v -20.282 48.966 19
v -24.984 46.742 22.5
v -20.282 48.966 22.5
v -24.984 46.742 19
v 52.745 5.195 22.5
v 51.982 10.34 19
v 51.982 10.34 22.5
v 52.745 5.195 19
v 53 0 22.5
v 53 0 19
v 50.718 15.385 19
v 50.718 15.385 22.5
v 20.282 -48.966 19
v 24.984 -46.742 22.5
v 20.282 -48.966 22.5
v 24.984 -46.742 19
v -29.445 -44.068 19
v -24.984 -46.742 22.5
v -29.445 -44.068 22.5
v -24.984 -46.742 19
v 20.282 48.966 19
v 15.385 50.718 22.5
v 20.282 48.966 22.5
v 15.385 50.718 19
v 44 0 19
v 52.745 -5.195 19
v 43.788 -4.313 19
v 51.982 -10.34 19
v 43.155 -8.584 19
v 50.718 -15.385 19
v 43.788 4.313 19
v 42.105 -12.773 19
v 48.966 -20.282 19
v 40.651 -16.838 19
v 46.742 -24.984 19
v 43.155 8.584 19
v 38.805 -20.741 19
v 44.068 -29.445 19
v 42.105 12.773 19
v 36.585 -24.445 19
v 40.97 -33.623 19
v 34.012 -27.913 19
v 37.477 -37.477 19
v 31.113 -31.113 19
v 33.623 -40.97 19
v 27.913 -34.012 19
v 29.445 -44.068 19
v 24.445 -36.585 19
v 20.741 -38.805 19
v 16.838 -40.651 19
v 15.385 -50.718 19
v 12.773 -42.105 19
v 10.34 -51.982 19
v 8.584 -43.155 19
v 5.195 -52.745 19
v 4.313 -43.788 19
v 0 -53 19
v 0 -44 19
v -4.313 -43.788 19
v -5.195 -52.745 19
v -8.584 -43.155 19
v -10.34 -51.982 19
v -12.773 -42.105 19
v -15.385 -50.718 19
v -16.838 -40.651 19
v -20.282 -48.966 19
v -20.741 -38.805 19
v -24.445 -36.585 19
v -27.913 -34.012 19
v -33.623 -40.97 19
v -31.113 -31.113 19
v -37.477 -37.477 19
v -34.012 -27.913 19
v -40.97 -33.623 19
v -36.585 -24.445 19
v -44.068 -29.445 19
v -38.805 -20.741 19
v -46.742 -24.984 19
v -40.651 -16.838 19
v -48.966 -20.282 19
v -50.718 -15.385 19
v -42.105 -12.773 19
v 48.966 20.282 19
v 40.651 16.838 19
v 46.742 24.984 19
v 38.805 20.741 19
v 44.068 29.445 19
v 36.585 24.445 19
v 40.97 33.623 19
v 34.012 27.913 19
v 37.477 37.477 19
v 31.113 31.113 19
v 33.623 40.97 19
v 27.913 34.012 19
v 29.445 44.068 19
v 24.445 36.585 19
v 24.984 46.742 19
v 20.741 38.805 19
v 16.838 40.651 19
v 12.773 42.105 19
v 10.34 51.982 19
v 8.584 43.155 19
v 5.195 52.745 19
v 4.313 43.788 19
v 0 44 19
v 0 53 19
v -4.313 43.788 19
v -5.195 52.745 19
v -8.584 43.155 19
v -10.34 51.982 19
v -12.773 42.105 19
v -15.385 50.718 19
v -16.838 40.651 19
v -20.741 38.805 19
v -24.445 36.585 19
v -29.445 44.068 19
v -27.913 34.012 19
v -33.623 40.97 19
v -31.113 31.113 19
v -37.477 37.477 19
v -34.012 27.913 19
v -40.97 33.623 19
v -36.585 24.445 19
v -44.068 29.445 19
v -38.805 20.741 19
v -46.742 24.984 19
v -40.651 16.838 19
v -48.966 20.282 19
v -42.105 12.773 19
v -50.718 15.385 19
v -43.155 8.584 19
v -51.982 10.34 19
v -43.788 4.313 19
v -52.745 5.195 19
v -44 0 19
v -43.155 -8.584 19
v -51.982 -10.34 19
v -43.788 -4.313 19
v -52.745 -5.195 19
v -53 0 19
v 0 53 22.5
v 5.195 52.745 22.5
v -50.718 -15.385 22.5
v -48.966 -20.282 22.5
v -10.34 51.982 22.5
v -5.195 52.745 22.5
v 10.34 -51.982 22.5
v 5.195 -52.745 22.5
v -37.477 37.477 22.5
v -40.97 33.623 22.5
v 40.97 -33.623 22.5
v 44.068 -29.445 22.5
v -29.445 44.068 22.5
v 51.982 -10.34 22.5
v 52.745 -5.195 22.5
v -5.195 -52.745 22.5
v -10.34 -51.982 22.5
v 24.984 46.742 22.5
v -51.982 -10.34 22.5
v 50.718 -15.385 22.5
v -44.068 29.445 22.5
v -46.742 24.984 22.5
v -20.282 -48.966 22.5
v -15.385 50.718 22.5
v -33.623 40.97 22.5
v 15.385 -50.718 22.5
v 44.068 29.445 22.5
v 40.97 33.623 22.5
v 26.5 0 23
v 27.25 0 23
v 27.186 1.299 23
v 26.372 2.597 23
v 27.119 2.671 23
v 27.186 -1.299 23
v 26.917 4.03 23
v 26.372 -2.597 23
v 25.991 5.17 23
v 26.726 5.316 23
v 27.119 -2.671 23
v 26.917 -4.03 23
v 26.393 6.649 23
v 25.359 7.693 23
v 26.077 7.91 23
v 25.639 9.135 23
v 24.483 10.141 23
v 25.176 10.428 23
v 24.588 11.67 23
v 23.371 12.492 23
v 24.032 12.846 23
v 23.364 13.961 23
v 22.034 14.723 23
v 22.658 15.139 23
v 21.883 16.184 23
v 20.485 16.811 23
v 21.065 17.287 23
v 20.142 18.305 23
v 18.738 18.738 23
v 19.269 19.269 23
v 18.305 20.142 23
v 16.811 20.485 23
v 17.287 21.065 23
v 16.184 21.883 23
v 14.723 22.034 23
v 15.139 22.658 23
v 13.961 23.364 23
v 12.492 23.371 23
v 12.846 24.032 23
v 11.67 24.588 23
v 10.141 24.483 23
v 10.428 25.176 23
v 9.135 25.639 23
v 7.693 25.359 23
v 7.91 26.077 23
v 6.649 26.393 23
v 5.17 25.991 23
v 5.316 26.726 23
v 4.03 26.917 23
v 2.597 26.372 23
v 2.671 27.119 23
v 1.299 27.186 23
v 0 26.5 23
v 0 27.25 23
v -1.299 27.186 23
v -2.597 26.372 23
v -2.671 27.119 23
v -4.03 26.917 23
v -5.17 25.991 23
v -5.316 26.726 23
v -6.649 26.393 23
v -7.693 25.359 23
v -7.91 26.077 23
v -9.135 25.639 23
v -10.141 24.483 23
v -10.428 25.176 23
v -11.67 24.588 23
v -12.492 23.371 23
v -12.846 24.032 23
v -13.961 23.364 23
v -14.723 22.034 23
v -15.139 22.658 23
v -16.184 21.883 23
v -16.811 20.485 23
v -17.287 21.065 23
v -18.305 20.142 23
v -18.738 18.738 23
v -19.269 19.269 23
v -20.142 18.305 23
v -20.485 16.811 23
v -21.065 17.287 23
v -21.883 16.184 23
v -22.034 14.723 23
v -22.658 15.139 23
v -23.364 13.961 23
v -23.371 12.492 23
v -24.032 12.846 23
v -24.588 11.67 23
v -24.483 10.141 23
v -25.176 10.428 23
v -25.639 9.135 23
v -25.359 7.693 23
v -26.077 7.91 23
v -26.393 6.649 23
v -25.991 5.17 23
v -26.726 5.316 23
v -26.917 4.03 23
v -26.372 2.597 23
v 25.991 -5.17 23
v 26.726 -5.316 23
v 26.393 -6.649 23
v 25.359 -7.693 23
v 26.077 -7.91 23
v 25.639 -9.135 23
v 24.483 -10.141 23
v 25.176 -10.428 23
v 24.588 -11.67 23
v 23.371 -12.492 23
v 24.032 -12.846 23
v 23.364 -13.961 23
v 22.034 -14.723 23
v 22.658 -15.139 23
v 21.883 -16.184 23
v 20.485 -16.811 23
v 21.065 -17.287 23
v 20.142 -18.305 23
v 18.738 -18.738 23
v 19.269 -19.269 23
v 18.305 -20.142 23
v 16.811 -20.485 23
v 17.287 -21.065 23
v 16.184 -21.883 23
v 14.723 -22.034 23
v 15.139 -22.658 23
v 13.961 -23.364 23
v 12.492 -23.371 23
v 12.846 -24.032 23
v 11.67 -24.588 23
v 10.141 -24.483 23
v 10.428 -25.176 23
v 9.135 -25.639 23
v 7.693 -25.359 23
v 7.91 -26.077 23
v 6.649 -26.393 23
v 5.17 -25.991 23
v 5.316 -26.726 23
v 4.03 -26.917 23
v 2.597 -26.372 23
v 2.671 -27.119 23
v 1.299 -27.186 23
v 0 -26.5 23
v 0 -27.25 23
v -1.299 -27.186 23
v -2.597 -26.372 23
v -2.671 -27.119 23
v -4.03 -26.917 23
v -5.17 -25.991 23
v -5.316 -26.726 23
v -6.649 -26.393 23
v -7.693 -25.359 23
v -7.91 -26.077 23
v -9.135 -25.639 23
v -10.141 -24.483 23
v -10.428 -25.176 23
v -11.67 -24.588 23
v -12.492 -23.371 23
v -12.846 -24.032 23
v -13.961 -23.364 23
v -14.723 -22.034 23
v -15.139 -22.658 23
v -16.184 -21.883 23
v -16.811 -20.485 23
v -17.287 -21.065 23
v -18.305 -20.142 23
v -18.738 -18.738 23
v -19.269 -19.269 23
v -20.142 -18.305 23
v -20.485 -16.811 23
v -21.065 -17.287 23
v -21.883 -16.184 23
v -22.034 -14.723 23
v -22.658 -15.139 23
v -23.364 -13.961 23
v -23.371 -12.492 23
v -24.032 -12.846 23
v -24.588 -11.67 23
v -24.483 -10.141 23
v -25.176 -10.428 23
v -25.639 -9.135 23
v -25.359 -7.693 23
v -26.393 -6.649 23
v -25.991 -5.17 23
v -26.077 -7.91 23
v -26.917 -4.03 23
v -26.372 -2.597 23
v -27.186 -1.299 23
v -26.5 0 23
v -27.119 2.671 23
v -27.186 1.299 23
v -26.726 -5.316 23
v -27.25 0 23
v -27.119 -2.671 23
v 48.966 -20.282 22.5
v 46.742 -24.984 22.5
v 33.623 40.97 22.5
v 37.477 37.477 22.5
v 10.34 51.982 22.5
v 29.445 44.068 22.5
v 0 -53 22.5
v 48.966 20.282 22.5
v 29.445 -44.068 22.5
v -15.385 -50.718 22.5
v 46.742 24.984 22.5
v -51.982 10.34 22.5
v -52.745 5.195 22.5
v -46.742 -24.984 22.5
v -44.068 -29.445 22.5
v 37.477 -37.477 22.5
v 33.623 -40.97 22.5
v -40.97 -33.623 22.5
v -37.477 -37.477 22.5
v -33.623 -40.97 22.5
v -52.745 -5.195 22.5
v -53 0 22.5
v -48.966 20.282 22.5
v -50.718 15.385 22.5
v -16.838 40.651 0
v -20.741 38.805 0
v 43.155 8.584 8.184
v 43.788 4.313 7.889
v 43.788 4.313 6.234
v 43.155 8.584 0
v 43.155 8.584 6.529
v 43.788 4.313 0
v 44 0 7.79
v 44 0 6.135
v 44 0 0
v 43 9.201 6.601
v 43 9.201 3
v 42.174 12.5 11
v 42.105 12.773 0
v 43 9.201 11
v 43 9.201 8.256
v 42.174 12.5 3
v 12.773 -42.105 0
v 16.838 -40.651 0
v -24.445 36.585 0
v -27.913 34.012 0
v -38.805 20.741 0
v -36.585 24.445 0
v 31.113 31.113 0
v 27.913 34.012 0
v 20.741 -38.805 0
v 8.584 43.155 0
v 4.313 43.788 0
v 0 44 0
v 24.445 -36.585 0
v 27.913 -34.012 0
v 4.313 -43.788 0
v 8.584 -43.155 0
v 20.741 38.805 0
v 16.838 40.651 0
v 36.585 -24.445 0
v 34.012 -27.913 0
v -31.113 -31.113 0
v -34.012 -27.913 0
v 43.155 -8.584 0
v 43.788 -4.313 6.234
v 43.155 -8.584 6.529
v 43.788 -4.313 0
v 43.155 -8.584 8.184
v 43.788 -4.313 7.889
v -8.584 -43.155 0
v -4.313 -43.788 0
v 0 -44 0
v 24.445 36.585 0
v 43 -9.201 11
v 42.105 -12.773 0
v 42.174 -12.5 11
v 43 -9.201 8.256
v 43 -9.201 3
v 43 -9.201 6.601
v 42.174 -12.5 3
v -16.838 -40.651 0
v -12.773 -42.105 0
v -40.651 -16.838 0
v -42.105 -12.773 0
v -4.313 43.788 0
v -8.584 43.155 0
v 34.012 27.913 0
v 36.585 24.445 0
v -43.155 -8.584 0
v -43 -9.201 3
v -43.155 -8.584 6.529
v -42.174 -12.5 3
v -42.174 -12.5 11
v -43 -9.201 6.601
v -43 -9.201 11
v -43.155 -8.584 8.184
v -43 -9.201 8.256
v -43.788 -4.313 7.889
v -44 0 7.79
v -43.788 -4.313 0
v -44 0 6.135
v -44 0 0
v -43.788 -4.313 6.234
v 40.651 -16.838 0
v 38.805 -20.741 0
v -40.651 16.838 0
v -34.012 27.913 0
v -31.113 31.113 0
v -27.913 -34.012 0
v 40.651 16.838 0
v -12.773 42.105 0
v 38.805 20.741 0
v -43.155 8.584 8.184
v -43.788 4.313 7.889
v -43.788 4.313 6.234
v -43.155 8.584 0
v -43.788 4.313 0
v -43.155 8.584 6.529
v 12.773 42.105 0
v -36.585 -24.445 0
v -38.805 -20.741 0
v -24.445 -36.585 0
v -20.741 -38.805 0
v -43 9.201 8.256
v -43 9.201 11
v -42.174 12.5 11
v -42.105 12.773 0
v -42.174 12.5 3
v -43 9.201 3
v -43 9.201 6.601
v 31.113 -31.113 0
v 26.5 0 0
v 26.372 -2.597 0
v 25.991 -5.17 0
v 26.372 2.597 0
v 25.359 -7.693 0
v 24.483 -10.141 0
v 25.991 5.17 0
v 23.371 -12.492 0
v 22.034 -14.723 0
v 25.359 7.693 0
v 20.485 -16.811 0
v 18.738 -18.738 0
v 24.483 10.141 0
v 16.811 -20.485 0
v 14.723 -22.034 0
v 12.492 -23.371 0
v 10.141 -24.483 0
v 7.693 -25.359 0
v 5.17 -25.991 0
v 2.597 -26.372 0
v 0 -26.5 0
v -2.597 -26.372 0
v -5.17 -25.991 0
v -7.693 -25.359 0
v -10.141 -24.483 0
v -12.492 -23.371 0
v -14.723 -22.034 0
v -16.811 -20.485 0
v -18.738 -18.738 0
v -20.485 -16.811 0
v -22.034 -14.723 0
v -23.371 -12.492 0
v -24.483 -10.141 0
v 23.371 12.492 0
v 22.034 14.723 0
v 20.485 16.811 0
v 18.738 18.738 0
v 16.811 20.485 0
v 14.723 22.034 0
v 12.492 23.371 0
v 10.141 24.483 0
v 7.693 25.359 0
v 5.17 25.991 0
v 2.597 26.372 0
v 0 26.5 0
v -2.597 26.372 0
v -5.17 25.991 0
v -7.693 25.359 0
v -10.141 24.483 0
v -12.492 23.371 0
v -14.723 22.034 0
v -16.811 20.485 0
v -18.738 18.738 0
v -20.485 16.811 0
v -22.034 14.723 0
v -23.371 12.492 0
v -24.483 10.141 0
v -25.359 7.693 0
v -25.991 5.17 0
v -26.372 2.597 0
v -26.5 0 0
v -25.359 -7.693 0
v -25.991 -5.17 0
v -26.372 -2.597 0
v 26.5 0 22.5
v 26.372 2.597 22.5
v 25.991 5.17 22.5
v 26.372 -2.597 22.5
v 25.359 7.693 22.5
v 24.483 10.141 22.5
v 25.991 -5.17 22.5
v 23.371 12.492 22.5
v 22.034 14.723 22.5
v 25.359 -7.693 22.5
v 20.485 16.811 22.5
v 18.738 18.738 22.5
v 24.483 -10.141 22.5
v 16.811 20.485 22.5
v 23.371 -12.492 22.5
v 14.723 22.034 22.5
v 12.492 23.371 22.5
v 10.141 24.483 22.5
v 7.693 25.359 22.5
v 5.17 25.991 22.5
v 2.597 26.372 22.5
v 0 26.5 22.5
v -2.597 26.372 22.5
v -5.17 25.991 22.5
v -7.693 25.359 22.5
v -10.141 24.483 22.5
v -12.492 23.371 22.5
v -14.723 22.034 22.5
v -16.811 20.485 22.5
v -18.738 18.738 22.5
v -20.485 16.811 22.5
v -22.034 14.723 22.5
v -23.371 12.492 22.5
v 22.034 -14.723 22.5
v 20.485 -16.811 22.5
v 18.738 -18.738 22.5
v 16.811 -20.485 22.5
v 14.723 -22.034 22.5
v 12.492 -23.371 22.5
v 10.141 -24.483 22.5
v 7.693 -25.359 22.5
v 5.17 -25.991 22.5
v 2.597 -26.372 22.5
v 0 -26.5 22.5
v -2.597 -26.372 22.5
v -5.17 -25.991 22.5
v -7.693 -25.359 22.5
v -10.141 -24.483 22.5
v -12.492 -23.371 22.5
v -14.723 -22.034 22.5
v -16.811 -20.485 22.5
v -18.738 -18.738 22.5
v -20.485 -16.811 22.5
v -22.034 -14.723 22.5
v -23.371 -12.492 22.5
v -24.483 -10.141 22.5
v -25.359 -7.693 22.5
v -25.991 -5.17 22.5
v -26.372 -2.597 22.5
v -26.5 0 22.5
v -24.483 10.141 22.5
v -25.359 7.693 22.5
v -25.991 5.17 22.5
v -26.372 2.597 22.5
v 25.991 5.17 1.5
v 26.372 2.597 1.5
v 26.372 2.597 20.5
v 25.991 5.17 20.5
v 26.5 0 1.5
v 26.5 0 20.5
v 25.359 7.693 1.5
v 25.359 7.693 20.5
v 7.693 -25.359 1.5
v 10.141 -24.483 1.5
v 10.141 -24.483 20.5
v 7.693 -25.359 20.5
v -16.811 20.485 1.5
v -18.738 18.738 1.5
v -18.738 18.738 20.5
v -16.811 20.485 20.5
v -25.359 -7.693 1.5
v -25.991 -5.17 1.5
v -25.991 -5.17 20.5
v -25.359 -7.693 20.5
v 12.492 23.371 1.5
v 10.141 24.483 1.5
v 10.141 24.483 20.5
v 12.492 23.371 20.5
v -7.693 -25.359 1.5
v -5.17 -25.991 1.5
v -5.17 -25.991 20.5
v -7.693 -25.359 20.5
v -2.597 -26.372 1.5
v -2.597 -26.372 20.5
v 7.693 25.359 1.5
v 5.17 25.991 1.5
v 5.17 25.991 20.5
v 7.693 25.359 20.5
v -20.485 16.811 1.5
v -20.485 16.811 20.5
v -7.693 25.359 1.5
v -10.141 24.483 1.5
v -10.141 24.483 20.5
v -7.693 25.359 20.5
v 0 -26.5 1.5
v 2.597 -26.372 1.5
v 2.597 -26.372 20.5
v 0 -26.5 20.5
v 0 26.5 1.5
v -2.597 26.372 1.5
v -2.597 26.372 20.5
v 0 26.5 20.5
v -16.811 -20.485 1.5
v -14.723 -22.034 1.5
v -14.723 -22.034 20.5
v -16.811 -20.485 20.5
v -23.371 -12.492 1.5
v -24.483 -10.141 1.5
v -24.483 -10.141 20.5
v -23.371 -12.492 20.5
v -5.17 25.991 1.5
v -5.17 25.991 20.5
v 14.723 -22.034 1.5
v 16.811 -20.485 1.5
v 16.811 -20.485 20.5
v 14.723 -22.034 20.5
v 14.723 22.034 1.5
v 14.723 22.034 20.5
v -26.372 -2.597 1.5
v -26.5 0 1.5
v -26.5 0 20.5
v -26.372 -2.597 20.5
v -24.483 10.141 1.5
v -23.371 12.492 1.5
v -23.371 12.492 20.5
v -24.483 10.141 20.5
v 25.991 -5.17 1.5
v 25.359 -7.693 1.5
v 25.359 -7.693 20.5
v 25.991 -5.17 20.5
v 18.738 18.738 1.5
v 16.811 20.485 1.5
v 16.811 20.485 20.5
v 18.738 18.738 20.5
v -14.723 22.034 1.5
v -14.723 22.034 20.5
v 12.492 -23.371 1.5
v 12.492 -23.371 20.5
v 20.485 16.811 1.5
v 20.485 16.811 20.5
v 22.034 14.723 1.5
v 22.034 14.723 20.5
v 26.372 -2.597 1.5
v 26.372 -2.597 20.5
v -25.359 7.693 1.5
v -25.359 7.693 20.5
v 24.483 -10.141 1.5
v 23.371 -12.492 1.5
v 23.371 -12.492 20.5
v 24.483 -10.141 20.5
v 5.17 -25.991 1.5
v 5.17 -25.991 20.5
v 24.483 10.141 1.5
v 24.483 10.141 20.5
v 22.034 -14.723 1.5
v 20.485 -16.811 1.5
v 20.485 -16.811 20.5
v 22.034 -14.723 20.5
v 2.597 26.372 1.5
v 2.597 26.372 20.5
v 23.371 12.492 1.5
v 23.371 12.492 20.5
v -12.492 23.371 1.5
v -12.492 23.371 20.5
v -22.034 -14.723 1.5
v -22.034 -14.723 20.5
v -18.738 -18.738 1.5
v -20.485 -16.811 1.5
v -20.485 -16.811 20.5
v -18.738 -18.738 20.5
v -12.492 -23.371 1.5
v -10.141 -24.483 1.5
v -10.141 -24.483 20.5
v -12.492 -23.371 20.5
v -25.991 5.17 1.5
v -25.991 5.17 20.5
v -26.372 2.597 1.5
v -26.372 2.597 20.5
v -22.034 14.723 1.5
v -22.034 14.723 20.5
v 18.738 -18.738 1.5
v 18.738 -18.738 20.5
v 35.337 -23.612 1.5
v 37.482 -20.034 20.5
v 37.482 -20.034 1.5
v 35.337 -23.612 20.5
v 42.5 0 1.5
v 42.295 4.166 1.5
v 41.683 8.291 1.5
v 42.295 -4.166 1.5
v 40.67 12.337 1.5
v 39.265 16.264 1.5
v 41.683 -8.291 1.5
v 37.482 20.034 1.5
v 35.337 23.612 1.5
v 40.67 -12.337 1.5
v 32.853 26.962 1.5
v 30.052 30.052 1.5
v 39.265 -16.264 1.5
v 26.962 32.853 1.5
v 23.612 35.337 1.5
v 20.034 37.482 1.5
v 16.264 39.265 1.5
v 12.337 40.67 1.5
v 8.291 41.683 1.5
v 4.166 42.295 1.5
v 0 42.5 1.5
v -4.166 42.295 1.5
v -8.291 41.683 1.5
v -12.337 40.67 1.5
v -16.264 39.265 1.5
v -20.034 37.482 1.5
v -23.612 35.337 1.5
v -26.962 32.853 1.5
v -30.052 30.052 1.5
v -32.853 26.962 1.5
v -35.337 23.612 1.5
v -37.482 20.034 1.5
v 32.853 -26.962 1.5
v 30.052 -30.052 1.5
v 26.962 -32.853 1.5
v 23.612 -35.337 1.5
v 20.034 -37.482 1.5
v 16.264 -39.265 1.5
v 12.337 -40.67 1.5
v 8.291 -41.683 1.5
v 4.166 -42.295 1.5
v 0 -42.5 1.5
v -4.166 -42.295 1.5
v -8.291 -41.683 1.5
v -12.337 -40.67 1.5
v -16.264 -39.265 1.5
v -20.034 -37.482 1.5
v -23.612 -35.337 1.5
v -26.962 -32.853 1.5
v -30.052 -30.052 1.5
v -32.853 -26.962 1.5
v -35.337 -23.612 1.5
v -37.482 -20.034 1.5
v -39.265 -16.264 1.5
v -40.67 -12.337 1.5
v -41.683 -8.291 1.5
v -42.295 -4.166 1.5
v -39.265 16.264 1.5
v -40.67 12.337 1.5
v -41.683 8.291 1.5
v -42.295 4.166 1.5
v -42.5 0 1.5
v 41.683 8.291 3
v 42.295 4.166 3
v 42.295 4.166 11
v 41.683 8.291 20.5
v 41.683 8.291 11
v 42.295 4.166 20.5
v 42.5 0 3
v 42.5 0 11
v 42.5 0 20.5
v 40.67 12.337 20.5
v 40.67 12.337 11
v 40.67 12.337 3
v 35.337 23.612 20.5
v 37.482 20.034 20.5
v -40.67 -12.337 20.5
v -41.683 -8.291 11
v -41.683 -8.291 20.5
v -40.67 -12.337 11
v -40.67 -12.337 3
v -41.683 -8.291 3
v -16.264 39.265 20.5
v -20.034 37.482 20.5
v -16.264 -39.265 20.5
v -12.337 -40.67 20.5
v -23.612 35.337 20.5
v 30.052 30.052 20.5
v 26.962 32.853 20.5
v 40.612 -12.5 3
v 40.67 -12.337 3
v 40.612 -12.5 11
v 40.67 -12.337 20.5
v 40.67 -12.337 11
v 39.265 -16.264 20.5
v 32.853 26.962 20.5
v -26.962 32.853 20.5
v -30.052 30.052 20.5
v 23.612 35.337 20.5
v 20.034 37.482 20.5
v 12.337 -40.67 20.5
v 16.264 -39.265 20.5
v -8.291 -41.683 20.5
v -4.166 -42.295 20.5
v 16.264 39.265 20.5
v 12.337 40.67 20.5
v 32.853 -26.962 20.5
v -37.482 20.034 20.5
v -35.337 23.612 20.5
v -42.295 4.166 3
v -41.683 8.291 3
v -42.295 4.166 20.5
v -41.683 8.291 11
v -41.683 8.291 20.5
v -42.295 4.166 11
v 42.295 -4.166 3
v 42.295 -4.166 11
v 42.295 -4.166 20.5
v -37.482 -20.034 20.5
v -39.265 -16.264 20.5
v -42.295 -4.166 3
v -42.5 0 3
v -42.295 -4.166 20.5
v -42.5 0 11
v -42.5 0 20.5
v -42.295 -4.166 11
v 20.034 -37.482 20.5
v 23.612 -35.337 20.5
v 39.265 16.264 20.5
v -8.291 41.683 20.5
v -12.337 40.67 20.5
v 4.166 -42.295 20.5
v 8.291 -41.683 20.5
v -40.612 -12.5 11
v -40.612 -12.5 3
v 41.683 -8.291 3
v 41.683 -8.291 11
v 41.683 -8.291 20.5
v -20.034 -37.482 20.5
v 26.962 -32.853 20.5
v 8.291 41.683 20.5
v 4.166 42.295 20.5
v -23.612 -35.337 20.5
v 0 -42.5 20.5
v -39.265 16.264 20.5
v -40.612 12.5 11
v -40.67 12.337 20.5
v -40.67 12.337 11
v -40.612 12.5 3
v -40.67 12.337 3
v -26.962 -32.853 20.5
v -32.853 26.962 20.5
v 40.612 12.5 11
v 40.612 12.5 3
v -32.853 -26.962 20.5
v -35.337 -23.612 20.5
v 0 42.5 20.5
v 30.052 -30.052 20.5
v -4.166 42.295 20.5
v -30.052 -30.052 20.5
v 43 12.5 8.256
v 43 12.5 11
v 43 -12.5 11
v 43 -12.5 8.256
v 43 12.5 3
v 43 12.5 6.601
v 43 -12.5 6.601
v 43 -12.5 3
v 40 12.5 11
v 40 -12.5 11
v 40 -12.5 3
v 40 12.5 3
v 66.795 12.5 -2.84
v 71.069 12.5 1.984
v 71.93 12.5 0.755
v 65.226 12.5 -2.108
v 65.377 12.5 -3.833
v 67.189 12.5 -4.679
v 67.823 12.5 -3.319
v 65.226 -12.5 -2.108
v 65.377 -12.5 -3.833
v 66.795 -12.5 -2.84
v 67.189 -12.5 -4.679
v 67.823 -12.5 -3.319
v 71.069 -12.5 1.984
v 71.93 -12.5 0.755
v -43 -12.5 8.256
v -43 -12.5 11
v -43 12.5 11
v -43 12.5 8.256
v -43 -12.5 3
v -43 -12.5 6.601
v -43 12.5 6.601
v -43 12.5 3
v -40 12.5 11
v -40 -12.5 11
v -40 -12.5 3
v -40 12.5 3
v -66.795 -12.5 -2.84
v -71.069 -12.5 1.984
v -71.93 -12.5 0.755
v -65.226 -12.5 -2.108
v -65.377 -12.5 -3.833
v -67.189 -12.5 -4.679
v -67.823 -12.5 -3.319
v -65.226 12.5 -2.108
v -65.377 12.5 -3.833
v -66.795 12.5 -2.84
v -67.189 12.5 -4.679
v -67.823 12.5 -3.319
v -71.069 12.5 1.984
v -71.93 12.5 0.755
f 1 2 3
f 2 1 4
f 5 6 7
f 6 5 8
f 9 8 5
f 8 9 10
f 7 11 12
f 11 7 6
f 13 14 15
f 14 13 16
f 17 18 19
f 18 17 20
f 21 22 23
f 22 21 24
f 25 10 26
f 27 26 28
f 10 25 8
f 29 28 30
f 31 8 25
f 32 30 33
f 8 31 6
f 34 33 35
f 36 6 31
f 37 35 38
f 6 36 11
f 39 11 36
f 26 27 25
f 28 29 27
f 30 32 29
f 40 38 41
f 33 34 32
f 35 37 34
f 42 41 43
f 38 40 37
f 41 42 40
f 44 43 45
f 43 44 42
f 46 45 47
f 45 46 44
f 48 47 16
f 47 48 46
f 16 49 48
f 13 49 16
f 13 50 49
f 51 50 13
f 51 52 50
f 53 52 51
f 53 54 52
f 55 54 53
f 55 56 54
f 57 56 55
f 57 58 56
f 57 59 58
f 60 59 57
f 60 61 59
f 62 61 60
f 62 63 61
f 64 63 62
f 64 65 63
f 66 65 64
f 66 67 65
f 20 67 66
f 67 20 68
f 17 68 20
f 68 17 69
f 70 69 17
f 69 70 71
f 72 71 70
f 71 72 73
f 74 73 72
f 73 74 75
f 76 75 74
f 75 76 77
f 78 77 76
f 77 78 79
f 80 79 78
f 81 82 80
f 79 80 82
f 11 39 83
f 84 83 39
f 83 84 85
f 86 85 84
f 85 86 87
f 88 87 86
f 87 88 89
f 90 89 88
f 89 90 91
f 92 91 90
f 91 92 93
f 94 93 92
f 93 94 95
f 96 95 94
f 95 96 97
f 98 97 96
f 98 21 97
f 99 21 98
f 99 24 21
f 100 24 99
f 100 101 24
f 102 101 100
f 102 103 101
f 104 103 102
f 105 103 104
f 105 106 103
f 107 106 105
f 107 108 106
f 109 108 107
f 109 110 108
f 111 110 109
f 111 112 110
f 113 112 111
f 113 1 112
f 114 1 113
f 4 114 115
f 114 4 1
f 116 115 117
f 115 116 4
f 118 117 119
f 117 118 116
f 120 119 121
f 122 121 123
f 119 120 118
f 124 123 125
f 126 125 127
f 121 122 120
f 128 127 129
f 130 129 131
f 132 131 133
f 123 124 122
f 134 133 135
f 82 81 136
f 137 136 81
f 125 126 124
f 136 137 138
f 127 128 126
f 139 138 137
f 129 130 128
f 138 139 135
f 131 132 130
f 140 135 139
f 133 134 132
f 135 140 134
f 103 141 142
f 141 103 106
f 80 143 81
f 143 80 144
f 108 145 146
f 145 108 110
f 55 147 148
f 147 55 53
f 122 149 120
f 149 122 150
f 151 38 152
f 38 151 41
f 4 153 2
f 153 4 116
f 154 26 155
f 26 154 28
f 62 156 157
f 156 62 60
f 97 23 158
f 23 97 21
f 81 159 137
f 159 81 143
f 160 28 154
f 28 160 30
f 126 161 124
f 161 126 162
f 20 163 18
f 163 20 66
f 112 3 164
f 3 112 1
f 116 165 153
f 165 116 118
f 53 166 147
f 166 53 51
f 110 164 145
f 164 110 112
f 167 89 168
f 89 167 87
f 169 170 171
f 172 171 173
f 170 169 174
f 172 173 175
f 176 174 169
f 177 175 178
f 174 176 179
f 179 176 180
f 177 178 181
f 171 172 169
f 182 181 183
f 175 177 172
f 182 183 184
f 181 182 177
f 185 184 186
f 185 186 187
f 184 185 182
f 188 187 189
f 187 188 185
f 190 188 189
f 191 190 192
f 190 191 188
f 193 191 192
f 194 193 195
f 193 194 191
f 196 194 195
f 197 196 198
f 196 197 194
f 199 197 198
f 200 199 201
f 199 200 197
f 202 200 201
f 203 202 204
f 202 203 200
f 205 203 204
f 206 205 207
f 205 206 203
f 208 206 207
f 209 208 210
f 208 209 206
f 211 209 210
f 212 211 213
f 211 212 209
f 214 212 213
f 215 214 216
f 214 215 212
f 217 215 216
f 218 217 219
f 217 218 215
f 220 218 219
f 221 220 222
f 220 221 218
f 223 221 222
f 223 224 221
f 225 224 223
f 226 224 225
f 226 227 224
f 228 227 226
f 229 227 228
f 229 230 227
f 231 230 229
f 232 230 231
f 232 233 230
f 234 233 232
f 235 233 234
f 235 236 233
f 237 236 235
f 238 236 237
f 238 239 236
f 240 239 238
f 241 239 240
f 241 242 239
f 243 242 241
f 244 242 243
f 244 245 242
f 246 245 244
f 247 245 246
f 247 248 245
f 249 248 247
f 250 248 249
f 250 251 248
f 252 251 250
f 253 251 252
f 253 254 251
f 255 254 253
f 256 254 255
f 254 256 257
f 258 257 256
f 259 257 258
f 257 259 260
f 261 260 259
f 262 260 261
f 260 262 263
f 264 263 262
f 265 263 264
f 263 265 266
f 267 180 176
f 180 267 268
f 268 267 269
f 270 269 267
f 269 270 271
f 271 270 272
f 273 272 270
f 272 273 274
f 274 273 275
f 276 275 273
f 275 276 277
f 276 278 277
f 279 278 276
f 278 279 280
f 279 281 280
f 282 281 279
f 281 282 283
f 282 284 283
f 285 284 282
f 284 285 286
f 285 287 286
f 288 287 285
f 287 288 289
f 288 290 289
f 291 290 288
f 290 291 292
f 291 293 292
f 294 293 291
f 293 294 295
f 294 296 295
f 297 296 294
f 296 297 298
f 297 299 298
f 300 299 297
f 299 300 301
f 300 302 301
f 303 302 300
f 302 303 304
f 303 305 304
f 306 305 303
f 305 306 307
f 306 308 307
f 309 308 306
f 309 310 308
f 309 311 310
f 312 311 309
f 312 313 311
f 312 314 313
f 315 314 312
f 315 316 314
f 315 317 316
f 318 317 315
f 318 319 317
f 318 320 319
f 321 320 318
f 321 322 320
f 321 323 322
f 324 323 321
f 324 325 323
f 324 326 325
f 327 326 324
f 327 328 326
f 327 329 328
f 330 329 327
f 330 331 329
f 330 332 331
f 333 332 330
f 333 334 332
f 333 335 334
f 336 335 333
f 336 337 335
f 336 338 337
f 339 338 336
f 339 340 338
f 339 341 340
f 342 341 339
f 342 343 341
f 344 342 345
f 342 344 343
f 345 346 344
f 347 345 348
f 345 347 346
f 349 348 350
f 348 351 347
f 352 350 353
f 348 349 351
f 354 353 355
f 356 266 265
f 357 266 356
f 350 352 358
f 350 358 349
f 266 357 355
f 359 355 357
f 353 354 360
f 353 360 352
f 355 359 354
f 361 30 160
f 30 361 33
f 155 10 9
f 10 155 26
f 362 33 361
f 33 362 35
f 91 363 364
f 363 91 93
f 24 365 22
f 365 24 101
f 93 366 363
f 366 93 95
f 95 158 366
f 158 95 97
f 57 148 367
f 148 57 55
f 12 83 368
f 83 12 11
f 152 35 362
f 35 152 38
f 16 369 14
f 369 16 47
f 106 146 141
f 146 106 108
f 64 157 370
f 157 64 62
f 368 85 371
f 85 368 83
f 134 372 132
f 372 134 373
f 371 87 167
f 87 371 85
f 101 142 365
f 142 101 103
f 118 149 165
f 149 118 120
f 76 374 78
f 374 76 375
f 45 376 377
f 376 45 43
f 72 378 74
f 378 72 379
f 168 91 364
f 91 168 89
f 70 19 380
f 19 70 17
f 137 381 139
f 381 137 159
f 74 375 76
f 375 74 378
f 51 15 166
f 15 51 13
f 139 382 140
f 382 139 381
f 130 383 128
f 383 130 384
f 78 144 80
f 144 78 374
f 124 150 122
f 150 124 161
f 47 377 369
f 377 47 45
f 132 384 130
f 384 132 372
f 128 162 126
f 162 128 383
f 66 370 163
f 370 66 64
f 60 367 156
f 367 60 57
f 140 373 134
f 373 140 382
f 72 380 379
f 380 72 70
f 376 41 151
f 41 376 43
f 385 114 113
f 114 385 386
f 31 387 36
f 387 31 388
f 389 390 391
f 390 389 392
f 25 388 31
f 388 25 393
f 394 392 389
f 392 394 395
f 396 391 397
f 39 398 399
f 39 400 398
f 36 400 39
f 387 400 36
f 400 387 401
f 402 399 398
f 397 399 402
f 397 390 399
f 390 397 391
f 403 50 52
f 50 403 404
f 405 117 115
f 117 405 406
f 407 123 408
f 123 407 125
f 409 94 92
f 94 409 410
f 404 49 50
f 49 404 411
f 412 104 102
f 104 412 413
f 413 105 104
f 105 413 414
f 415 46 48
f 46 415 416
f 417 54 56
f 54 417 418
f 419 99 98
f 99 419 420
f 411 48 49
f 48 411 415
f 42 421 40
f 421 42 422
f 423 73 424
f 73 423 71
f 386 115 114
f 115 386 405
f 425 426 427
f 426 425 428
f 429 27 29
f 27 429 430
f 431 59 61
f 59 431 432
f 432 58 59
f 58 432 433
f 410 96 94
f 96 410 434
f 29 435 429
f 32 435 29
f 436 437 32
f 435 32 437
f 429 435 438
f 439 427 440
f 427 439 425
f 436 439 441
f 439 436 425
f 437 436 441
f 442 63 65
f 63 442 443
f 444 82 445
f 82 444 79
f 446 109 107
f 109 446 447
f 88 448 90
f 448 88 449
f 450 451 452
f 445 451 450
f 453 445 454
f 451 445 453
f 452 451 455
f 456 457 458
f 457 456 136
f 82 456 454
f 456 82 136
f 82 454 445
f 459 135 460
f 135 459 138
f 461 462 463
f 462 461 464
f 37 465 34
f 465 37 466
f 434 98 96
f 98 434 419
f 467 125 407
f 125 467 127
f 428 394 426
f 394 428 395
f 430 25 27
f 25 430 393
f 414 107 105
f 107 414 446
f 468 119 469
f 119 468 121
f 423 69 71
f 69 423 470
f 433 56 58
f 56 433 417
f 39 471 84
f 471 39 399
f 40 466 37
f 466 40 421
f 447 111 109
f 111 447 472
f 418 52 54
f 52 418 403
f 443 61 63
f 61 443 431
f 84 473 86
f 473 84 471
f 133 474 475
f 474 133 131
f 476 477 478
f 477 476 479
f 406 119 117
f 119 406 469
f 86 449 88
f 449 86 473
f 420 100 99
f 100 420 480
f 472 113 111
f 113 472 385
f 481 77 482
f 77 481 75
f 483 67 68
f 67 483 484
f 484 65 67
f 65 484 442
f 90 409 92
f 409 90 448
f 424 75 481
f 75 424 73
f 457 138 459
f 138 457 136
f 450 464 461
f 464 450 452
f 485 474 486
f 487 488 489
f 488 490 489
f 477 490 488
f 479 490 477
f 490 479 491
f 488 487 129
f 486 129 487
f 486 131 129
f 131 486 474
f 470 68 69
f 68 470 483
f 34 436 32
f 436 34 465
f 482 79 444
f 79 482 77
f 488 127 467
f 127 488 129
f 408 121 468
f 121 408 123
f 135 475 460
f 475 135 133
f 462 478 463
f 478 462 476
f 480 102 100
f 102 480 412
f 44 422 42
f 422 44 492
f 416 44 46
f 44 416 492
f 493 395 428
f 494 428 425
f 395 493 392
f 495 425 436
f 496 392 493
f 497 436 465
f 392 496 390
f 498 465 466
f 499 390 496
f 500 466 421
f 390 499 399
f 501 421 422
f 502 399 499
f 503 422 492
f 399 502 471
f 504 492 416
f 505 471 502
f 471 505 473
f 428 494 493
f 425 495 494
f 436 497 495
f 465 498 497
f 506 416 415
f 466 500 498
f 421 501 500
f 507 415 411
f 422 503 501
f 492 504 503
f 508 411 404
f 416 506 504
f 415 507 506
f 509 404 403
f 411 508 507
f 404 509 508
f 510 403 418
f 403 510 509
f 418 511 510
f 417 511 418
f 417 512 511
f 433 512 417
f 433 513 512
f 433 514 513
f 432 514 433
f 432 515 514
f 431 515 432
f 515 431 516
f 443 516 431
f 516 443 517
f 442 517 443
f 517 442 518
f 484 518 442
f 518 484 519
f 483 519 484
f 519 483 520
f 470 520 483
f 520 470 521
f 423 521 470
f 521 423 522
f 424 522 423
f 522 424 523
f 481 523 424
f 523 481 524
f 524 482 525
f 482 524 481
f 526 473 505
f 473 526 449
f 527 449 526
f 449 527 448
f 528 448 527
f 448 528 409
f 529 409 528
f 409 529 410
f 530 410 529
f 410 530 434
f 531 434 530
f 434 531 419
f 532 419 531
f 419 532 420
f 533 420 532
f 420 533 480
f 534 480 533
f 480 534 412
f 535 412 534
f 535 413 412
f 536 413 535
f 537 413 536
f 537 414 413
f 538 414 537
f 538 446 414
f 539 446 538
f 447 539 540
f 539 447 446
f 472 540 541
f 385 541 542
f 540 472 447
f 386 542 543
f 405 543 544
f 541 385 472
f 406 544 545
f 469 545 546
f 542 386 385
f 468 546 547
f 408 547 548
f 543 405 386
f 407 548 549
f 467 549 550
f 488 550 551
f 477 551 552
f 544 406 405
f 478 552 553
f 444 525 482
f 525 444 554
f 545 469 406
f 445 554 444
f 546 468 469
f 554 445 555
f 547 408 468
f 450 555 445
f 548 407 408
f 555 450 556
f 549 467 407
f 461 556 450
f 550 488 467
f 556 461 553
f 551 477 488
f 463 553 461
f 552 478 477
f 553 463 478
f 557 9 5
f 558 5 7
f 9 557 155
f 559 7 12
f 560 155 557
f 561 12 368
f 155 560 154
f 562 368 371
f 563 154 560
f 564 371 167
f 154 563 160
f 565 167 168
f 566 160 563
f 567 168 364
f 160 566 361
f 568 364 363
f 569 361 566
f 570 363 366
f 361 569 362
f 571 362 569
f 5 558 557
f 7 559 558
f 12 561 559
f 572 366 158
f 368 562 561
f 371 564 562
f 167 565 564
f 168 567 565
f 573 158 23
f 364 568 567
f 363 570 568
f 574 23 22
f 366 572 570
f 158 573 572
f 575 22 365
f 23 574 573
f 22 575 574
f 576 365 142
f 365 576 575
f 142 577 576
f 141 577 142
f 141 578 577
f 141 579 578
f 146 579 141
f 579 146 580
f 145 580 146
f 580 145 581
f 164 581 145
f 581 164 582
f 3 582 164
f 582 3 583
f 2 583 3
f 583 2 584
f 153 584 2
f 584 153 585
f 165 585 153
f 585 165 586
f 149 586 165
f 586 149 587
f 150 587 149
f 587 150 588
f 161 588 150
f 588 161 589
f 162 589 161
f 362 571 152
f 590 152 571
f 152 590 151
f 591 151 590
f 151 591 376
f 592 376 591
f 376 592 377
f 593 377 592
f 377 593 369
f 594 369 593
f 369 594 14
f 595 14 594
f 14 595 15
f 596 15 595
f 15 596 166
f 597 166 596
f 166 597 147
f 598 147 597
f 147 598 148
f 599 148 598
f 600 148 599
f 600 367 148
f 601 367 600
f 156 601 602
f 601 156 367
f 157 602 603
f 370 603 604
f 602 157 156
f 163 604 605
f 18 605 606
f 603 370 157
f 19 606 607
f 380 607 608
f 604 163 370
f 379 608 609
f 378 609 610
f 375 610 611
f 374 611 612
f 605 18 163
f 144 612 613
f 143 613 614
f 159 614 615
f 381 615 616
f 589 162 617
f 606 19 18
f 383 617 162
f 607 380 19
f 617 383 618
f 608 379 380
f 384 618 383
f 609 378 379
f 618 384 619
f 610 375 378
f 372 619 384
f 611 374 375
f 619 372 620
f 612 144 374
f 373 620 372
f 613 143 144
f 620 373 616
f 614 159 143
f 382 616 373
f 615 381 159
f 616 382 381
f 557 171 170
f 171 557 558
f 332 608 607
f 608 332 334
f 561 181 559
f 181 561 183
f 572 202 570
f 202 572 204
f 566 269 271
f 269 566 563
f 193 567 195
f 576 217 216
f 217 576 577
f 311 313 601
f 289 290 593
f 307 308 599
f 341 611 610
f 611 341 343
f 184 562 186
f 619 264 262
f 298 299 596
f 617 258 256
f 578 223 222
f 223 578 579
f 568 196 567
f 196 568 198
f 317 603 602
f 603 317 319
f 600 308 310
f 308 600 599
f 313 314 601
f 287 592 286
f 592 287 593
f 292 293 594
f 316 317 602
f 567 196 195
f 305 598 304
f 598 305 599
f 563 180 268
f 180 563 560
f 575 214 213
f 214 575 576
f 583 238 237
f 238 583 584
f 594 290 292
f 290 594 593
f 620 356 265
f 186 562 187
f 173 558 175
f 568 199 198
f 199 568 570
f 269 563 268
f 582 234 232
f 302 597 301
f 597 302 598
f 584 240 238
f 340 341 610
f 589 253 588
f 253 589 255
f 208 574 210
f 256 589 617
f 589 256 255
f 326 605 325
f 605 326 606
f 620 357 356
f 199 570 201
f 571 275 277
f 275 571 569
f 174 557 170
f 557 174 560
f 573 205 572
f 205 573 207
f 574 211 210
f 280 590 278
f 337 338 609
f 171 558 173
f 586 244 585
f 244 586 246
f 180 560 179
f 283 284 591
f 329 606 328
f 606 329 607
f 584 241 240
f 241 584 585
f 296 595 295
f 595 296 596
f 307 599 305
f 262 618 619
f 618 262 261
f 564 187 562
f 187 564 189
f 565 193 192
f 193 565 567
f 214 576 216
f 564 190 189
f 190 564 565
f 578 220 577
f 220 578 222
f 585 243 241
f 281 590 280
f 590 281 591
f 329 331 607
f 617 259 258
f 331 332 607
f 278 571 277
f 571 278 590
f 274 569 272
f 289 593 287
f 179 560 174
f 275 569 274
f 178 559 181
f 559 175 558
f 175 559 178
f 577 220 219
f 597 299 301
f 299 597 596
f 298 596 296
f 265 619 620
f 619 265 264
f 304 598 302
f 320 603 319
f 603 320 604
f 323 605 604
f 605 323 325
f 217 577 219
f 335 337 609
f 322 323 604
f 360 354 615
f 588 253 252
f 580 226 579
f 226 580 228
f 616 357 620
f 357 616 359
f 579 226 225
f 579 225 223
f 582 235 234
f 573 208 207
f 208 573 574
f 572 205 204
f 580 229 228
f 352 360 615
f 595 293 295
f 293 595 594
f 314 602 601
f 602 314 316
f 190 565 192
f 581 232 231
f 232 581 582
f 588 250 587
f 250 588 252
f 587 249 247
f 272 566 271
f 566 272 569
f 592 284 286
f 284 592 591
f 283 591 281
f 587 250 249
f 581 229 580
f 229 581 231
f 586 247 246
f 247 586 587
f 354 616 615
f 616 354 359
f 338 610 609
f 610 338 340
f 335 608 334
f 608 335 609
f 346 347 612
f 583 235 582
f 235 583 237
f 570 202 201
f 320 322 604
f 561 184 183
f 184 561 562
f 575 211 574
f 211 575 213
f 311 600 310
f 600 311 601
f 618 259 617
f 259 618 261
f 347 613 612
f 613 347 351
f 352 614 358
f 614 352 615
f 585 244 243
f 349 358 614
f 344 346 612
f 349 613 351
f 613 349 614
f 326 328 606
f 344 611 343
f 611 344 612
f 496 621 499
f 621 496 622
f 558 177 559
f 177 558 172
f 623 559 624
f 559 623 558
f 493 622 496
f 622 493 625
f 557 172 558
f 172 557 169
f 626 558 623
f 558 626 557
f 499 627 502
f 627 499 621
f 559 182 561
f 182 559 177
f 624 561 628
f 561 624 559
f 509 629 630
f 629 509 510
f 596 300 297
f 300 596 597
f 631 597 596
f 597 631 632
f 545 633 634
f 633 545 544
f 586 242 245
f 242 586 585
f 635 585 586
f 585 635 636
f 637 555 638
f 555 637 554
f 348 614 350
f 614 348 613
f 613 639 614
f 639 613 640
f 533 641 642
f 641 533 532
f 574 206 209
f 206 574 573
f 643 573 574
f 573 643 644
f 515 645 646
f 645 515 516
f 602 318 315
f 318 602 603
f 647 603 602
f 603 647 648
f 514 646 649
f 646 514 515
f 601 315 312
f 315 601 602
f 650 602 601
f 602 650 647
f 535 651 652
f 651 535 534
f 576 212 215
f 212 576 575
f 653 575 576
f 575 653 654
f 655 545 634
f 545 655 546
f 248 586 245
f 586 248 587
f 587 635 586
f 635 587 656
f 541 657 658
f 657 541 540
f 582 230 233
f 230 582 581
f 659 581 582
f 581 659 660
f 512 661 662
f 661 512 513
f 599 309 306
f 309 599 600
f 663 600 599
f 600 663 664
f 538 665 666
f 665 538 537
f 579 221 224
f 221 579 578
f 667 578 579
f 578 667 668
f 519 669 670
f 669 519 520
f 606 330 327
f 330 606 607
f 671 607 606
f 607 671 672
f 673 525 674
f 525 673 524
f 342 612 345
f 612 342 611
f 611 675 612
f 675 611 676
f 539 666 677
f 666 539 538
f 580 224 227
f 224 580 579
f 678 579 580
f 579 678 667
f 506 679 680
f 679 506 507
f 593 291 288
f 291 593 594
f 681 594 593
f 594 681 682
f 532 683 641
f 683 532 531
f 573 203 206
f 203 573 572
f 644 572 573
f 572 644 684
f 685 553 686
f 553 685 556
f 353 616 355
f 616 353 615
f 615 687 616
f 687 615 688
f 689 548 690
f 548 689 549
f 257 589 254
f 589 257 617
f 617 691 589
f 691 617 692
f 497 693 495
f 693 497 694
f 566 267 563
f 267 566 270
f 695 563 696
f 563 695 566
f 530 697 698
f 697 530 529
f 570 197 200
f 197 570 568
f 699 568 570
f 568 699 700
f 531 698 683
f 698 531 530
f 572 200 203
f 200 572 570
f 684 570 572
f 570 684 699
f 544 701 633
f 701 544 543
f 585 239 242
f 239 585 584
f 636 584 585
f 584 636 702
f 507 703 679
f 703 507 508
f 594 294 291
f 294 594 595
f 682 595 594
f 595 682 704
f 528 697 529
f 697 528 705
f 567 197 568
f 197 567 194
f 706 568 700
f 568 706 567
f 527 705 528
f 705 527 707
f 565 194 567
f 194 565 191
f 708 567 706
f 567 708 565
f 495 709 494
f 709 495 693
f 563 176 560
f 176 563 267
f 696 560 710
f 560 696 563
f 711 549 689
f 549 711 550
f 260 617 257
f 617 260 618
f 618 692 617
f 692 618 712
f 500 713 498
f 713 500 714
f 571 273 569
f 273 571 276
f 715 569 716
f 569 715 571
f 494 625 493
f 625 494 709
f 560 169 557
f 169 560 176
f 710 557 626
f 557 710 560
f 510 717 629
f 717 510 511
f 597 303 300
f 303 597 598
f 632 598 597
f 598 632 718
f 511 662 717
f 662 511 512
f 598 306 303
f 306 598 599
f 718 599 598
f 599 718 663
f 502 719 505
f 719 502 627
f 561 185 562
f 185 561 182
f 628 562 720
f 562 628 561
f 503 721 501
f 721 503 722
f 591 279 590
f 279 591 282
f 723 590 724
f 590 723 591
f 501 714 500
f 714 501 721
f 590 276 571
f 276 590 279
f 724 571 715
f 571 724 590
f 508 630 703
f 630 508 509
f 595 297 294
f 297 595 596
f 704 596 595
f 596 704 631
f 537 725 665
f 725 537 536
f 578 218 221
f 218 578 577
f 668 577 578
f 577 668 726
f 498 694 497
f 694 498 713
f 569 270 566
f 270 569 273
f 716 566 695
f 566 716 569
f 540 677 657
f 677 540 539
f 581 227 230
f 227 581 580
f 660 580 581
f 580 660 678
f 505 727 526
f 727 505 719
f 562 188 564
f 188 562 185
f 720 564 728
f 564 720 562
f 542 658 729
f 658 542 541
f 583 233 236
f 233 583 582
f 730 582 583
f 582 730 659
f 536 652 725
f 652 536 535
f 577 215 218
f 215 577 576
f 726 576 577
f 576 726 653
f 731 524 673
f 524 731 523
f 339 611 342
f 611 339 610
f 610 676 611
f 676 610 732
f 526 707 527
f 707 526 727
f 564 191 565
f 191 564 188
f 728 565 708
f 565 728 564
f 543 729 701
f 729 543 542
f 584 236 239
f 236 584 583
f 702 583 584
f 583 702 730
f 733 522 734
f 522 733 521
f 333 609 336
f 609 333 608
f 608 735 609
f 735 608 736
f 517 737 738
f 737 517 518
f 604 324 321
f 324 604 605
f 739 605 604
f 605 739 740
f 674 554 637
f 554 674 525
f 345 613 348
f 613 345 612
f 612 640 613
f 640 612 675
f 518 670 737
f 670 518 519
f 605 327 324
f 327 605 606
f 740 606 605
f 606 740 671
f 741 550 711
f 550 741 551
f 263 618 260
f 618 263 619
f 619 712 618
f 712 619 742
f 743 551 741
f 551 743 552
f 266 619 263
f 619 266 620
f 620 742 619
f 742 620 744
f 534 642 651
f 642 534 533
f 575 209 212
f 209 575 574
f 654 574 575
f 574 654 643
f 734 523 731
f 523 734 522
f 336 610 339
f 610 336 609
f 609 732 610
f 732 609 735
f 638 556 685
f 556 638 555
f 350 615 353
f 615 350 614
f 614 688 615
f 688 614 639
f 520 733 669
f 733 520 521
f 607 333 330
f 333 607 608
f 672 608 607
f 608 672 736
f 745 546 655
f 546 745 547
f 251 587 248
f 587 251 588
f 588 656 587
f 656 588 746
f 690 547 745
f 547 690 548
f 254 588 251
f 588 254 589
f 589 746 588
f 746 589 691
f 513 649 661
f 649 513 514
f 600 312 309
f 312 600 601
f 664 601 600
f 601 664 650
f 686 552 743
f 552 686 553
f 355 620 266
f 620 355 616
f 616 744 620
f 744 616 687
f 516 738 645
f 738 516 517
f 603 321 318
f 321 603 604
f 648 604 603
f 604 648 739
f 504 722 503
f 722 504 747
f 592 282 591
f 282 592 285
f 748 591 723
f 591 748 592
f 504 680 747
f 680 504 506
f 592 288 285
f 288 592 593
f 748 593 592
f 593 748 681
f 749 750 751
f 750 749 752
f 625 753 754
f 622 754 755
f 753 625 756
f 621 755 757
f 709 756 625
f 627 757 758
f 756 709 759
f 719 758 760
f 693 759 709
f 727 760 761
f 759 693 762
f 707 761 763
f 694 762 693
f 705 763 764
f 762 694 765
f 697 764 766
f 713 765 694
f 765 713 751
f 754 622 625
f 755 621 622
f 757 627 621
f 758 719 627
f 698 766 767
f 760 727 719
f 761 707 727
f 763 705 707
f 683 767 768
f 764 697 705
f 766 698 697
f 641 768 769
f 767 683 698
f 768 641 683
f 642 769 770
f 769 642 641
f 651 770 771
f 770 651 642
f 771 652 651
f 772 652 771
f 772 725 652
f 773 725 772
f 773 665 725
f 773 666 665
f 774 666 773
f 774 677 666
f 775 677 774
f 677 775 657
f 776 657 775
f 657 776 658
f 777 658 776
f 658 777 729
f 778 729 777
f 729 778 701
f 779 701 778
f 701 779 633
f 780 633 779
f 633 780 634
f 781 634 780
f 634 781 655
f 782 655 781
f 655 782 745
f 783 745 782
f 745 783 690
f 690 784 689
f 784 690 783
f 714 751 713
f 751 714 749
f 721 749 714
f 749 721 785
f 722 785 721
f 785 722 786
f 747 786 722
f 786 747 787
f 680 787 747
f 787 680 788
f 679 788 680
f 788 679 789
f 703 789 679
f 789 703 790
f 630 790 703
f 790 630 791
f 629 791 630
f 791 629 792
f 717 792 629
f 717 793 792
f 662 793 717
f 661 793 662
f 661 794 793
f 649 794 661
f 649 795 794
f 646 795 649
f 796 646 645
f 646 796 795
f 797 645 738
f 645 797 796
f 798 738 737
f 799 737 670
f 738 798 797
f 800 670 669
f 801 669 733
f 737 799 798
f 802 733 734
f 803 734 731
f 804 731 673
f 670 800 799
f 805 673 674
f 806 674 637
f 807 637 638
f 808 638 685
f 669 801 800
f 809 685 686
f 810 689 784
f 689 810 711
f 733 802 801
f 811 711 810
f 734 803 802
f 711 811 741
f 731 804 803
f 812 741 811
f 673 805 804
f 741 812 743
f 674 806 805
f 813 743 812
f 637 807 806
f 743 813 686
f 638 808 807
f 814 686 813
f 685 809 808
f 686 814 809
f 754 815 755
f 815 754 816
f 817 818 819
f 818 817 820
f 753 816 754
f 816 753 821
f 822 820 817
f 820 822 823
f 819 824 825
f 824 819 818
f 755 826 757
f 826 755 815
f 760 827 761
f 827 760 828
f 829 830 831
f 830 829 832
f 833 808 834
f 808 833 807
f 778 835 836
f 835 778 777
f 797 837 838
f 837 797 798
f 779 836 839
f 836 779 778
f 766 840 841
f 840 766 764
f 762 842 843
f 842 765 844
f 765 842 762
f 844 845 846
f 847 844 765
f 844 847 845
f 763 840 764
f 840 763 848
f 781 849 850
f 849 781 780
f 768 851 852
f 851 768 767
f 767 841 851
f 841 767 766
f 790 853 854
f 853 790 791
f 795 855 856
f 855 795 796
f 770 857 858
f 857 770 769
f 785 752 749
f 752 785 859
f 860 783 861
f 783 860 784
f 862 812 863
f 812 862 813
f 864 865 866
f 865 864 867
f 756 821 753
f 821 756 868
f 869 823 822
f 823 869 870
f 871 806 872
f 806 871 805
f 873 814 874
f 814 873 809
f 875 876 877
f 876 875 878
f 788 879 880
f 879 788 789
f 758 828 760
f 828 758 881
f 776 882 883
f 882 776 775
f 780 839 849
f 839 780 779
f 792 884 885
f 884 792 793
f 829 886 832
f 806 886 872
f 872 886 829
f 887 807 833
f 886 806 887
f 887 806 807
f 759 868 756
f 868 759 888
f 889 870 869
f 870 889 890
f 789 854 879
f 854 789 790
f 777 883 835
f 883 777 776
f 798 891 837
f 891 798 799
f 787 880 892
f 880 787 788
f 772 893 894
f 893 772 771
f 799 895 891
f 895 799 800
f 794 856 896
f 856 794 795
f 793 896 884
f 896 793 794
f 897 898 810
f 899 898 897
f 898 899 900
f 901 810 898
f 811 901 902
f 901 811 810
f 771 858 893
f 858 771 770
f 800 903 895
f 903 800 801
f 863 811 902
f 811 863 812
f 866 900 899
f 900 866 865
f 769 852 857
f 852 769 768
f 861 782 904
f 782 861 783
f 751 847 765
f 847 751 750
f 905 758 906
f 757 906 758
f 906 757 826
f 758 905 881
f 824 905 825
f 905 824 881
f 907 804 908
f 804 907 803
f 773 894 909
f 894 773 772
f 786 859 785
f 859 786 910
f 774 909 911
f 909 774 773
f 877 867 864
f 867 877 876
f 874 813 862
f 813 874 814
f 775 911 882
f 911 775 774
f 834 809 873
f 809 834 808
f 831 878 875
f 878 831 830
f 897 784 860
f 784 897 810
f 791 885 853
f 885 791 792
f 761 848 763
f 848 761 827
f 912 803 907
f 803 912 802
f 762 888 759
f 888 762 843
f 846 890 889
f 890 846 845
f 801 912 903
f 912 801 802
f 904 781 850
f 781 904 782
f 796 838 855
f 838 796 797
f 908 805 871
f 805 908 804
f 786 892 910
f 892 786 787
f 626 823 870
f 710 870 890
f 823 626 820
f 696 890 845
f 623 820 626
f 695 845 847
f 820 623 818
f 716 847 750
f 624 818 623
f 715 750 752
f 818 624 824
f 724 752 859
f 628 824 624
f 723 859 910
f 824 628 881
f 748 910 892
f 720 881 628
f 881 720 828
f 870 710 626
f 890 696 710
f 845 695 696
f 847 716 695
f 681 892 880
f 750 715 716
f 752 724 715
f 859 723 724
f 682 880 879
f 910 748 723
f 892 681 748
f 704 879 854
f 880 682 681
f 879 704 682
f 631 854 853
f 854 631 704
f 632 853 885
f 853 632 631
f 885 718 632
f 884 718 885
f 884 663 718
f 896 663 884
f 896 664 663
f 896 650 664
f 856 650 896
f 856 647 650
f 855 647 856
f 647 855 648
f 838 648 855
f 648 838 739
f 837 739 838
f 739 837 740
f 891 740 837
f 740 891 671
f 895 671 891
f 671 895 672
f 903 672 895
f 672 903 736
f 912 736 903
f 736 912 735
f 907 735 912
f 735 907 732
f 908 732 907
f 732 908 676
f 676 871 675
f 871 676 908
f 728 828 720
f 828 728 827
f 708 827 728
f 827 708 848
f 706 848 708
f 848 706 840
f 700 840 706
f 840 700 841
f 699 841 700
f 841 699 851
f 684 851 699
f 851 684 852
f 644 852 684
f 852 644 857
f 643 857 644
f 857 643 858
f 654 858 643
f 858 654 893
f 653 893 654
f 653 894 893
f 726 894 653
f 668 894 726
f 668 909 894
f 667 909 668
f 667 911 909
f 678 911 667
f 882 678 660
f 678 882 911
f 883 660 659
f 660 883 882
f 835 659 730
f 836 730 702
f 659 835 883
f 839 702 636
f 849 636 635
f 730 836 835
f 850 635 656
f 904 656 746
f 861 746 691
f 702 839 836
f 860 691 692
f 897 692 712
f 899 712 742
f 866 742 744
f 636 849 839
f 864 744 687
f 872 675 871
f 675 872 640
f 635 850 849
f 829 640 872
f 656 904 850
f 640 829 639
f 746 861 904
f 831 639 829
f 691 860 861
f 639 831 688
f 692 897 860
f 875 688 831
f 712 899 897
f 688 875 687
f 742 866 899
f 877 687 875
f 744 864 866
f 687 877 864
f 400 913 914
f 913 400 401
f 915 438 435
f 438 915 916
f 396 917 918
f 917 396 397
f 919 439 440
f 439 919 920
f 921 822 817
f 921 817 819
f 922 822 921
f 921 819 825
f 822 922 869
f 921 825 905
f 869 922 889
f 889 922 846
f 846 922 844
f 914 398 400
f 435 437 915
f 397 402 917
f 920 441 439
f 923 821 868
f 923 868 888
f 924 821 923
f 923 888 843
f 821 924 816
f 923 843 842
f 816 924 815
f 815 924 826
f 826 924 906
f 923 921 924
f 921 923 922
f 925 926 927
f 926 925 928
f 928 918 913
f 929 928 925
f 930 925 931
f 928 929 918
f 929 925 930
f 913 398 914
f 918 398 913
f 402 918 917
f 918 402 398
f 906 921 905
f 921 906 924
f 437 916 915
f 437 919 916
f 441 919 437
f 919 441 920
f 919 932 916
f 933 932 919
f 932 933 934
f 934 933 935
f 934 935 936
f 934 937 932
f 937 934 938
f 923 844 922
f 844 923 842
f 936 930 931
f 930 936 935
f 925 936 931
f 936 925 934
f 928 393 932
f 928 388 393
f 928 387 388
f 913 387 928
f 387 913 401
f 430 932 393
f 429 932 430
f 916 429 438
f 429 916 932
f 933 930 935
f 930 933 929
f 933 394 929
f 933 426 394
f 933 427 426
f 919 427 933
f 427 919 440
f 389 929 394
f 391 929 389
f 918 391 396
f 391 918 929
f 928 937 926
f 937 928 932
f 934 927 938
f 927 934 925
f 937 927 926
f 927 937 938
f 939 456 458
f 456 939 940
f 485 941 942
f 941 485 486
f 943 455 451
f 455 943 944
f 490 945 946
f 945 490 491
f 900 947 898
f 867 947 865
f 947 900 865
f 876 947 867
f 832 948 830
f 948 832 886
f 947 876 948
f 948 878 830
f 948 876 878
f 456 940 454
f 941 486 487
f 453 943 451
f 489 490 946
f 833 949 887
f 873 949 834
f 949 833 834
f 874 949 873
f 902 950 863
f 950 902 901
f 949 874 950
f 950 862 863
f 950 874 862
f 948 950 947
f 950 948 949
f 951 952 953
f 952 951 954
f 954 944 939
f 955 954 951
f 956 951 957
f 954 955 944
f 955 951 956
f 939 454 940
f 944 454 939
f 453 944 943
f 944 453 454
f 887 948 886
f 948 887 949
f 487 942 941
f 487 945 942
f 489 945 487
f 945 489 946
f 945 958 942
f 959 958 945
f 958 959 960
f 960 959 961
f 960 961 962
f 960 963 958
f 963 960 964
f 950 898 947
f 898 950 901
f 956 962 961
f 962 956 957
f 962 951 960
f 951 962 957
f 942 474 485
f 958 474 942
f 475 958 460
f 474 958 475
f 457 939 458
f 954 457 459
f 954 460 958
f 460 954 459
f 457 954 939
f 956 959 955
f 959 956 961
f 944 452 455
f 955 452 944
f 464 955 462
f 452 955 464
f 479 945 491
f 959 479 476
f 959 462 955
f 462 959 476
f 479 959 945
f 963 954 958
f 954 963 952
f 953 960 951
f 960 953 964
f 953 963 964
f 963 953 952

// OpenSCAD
/*
 * Встраиваемый светильник GX53
 * Модель: OGX-R1-001-GX53-DIY (ОНЛАЙТ DIY)
 * Для: Михаил Ковалев, ООО "Эверест-Тех"
 * Автор: Бонд (OpenClaw Agent)
 * Дата: 2026-02-09
 */

// === РАЗМЕРЫ (мм) ===
outer_dia = 106;           // Внешний диаметр фланца
cutout_dia = 90;           // Врезное отверстие
inner_dia = 53;            // Посадка под GX53
total_height = 23;         // Общая высота
flange_height = 4;         // Высота фланца (видимая часть)
body_height = 19;          // Высота корпуса (в потолке)
wall_thick = 1.5;          // Толщина стенки

// Пружины
spring_wire = 1.5;         // Диаметр проволоки
spring_width = 25;         // Ширина пружины
spring_length = 30;        // Длина пружины
spring_angle = 25;         // Угол отгиба

$fn = 64;  // Качество окружностей

// === ОСНОВНОЙ КОРПУС ===
module lamp_body() {
    difference() {
        union() {
            // Фланец (видимая часть сверху)
            translate([0, 0, body_height])
            cylinder(h=flange_height, d=outer_dia);
            
            // Корпус (в потолке)
            cylinder(h=body_height, d=cutout_dia - 2);
        }
        
        // Центральное отверстие под лампу
        translate([0, 0, -1])
        cylinder(h=total_height + 2, d=inner_dia);
        
        // Внутренняя полость корпуса
        translate([0, 0, wall_thick])
        cylinder(h=body_height, d=cutout_dia - 2 - wall_thick*2);
        
        // Скос на фланце (эстетика)
        translate([0, 0, body_height + flange_height - 0.5])
        difference() {
            cylinder(h=1, d=outer_dia + 1);
            cylinder(h=1, d1=inner_dia, d2=inner_dia + 3);
        }
    }
}

// === ПРУЖИННЫЙ ФИКСАТОР ===
module spring_clip() {
    // Основание (крепление к корпусу)
    translate([0, -spring_width/2, 0])
    cube([3, spring_width, 8]);
    
    // Пружина (отогнутая часть)
    translate([0, 0, 5])
    rotate([0, spring_angle, 0])
    translate([0, -spring_width/2, 0])
    cube([spring_length, spring_width, spring_wire]);
    
    // Загнутый конец
    translate([0, 0, 5])
    rotate([0, spring_angle, 0])
    translate([spring_length - 2, -spring_width/2, 0])
    rotate([0, -60, 0])
    cube([8, spring_width, spring_wire]);
}

// === СБОРКА ===
module gx53_lamp() {
    color("White")
    lamp_body();
    
    // Пружины (2 шт, напротив друг друга)
    color("Silver") {
        translate([cutout_dia/2 - 5, 0, 3])
        spring_clip();
        
        rotate([0, 0, 180])
        translate([cutout_dia/2 - 5, 0, 3])
        spring_clip();
    }
}

// Рендер
gx53_lamp();

// Информация
echo("=== GX53 Светильник ===");
echo(str("Внешний Ø: ", outer_dia, " мм"));
echo(str("Врезное Ø: ", cutout_dia, " мм"));
echo(str("Высота: ", total_height, " мм"));
